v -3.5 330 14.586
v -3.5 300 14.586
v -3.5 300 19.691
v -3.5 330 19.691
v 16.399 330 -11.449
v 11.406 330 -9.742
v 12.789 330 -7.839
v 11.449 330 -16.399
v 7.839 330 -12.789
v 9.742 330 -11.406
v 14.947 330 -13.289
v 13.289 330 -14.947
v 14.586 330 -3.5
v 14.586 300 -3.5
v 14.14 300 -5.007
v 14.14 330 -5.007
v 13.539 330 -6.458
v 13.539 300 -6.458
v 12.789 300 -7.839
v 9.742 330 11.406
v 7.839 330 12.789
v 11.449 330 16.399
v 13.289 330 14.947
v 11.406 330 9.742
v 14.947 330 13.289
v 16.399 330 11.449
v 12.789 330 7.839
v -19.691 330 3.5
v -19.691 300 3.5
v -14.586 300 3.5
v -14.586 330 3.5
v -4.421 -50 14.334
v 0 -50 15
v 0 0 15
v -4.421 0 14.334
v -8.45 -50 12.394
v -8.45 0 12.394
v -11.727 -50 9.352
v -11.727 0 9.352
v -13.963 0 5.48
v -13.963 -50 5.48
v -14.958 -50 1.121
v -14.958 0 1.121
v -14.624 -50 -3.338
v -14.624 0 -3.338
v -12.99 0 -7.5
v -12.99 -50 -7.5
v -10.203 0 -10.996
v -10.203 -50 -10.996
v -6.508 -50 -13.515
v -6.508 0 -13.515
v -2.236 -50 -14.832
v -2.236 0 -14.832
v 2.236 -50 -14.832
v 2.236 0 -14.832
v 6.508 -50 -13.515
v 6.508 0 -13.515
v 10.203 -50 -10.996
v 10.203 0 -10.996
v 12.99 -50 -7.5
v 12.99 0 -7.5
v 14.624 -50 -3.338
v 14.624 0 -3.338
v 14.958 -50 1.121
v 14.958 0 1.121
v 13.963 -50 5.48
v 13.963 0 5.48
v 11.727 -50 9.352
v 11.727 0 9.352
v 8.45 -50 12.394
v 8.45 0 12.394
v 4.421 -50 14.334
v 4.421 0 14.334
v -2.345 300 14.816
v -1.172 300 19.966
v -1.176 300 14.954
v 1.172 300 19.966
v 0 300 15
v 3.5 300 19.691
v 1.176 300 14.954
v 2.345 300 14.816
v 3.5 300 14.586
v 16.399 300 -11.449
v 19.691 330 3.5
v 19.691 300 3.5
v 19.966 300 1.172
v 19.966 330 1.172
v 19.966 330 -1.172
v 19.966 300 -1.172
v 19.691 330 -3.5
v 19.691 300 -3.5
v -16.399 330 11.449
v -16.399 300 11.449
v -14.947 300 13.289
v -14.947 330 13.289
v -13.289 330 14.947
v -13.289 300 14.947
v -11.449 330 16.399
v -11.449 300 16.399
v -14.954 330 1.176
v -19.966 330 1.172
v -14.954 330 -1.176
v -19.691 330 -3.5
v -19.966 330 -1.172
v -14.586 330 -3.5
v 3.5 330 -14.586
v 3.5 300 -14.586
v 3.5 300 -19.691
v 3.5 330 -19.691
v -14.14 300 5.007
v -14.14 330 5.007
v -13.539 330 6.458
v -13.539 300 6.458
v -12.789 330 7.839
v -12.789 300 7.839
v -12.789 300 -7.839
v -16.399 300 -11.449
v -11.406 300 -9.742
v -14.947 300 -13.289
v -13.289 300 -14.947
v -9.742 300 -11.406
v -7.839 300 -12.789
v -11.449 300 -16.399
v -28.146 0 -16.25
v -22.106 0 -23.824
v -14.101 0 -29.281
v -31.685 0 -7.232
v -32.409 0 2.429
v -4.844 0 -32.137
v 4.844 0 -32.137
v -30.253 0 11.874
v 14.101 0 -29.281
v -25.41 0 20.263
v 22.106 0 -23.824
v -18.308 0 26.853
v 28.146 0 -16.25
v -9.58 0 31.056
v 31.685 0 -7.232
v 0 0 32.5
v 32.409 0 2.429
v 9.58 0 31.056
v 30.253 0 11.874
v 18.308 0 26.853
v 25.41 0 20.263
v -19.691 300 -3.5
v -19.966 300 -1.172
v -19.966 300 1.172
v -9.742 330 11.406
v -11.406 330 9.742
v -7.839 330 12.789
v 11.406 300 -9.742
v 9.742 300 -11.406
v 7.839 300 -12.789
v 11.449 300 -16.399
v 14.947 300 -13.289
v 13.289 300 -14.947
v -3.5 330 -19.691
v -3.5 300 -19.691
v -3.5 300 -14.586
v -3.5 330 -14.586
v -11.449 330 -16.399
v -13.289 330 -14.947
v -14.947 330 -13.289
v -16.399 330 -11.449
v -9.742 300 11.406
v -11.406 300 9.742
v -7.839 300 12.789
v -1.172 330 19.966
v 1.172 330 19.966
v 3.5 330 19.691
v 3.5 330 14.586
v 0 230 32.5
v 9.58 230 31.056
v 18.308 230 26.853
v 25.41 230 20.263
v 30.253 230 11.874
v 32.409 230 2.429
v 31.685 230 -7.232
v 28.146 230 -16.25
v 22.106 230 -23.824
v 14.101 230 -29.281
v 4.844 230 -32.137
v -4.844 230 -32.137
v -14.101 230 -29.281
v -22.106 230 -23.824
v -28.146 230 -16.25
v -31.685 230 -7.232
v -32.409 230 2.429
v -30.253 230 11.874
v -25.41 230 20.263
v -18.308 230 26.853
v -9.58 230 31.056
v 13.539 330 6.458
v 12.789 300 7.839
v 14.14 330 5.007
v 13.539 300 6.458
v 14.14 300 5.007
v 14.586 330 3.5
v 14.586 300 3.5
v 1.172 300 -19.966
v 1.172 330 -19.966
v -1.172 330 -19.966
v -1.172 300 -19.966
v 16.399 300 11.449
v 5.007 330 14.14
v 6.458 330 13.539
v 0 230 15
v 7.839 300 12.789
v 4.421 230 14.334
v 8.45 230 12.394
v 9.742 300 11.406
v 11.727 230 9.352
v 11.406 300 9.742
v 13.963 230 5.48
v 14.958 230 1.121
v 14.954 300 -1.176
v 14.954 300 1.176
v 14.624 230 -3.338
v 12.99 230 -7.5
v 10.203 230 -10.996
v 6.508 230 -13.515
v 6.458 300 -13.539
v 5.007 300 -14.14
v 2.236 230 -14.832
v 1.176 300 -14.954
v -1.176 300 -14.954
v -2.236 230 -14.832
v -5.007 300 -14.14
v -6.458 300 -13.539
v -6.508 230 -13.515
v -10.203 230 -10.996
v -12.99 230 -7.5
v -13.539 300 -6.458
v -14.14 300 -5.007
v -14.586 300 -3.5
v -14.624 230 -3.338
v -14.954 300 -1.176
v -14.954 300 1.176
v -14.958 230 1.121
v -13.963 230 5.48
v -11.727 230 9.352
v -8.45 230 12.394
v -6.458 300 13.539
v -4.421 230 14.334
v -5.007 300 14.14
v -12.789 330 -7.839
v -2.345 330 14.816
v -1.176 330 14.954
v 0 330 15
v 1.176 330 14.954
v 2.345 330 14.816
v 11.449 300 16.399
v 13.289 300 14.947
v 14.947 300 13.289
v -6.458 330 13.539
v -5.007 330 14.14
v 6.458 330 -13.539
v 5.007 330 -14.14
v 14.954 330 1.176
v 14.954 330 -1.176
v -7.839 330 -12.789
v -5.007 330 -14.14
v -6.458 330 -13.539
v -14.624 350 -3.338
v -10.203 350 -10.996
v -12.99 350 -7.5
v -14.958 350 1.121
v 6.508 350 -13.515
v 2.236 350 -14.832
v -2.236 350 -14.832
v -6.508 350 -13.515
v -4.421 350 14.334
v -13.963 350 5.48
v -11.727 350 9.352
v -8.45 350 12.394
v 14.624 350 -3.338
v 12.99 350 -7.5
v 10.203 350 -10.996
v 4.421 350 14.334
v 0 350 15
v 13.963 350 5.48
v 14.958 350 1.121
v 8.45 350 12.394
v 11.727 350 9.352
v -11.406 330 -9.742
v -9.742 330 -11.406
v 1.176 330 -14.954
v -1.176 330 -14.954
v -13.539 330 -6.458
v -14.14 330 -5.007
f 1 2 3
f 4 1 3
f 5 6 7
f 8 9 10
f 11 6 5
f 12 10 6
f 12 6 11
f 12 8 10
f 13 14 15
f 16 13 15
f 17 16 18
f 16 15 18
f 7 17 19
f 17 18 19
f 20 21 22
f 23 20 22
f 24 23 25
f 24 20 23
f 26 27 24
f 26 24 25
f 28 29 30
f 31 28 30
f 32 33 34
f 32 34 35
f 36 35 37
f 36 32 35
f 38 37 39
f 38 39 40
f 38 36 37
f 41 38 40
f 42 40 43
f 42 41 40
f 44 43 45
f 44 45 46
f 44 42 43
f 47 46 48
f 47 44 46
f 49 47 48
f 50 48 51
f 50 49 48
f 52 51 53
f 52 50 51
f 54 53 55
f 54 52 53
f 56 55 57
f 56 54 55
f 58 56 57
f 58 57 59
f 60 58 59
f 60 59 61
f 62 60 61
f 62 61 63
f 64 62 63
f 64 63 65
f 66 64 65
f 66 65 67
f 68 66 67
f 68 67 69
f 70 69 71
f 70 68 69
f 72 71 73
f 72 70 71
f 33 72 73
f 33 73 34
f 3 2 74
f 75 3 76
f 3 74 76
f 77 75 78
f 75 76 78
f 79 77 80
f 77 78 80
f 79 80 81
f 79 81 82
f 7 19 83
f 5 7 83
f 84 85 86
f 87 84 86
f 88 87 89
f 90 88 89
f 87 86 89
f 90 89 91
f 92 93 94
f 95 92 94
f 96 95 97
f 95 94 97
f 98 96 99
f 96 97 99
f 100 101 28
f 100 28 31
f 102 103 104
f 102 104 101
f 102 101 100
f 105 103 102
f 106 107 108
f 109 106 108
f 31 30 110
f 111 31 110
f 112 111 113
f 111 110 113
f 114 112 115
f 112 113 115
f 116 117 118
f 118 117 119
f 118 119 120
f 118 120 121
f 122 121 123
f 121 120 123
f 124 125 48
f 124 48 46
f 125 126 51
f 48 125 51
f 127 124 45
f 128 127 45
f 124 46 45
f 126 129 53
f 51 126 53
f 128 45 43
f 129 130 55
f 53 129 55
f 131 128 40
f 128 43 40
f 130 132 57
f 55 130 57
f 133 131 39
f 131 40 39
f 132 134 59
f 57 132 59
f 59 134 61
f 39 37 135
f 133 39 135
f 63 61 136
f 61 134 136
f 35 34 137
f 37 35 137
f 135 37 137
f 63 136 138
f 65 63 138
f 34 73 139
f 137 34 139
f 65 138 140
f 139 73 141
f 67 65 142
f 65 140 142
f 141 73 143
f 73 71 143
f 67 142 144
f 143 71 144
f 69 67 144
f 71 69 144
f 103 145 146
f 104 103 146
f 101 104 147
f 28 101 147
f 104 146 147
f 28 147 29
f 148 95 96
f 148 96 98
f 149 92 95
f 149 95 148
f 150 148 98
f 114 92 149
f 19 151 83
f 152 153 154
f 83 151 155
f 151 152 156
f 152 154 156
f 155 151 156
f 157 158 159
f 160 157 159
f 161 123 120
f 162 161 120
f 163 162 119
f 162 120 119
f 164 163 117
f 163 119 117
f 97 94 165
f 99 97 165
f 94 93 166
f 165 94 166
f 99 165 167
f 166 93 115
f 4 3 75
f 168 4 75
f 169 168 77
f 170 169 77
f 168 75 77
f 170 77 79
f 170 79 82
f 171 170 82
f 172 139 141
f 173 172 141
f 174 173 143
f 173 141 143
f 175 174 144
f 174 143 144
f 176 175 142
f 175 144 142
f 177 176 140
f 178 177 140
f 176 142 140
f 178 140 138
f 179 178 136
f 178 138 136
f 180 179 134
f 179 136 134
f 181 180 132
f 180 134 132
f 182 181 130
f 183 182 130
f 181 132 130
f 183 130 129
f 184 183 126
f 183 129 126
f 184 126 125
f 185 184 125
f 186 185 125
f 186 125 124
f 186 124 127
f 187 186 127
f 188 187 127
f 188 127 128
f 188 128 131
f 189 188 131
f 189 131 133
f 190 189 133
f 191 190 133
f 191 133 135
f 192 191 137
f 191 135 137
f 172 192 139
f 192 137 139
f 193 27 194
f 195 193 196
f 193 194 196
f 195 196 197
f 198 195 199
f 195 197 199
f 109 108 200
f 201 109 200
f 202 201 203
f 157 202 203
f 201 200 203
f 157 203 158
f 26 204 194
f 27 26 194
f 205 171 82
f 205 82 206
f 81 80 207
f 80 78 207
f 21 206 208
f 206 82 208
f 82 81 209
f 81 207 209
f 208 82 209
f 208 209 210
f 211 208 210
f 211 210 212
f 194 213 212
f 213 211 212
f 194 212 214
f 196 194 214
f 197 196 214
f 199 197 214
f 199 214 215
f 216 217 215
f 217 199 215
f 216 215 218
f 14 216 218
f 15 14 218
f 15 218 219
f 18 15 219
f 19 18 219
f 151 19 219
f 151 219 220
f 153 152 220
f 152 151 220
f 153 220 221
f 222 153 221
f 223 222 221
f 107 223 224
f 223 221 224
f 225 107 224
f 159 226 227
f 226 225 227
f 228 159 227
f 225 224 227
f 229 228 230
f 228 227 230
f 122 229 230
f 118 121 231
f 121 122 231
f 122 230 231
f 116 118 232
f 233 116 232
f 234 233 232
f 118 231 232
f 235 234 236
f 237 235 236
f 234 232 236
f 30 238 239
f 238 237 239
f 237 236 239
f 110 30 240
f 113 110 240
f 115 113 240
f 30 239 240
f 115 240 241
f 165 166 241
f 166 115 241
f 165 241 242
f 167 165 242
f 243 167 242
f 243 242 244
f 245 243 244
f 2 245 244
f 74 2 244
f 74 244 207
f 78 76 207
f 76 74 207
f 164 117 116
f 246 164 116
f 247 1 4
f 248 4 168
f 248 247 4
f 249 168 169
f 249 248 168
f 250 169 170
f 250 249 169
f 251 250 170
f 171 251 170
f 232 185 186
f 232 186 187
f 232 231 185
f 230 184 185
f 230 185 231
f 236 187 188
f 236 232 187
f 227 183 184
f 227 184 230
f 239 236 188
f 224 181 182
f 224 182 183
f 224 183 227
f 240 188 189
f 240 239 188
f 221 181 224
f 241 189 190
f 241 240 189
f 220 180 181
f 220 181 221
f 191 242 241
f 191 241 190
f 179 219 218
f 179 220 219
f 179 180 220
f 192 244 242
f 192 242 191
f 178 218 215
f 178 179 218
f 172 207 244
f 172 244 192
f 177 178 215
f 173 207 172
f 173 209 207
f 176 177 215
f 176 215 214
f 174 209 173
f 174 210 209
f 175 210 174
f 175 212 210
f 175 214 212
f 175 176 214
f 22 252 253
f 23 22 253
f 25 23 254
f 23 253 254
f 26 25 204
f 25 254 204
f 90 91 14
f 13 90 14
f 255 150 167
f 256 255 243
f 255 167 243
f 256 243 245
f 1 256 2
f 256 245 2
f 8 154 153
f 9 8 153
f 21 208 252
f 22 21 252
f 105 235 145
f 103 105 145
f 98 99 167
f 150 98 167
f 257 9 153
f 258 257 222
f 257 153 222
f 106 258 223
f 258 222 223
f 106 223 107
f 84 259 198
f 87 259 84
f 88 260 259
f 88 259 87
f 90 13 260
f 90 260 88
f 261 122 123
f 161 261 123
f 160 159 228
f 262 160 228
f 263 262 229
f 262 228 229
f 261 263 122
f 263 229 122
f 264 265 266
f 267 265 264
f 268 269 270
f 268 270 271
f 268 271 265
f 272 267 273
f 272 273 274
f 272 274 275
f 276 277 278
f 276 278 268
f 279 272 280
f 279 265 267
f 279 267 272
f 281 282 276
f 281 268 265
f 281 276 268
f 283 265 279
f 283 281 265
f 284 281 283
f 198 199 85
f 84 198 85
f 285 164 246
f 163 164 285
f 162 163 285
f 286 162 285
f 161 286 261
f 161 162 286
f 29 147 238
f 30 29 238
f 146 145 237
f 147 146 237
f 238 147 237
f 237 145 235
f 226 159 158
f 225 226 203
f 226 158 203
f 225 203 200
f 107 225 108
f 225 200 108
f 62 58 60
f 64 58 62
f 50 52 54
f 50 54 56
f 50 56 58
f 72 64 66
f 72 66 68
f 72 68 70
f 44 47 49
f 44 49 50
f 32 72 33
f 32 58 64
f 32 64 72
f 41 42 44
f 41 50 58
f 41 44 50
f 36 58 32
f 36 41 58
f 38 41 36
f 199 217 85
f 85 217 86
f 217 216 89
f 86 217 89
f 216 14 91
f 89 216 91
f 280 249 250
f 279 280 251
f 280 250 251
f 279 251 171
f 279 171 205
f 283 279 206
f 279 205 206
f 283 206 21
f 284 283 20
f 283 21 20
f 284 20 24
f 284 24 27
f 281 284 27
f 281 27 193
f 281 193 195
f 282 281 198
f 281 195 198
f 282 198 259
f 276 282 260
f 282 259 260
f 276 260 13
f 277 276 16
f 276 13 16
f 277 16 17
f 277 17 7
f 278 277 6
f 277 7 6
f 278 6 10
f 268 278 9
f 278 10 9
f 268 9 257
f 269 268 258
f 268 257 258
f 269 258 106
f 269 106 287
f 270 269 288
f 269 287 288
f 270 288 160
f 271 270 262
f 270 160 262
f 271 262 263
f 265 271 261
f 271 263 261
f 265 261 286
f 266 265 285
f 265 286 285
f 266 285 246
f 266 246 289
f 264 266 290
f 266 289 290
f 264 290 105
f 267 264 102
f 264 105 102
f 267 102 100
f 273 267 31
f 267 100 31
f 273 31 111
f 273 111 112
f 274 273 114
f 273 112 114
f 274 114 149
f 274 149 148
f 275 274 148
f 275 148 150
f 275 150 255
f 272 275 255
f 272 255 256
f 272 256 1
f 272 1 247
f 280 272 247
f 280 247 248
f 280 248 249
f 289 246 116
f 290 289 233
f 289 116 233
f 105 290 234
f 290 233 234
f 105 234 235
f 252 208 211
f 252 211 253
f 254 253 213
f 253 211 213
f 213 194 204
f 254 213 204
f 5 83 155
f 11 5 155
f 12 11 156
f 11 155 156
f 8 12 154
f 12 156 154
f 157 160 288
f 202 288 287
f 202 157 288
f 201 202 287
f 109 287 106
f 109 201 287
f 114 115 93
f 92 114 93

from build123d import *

# Parameters (mm, degrees)
SKETCH1_R           = 32.5
BOSS_EXTRUDE1_DEPTH = 230
SKETCH2_R           = 15
BOSS_EXTRUDE2_DEPTH = 100
BOSS_EXTRUDE3_START = 50
SKETCH3_R           = 15
BOSS_EXTRUDE3_DEPTH = 50
BOSS_EXTRUDE4_START = -30
BOSS_EXTRUDE4_DEPTH = 30
SKETCH5_R           = 15
BOSS_EXTRUDE5_DEPTH = 20


with BuildPart() as part:
    # Sketch1 → Boss-Extrude1 (new body)
    with BuildSketch(Plane(origin=(0, 0, 0), x_dir=(1, 0, 0), z_dir=(0, 1, 0))):
        with Locations(Location((0, 0, 0), (0, 0, 270))):
            Circle(SKETCH1_R)
    extrude(amount=BOSS_EXTRUDE1_DEPTH)

    # Sketch2 → Boss-Extrude2 (add)
    with BuildSketch(Plane(origin=(0, 230, 0), x_dir=(1, 0, 0), z_dir=(0, 1, 0))):
        with Locations(Location((0, 0, 0), (0, 0, 270))):
            Circle(SKETCH2_R)
    extrude(amount=BOSS_EXTRUDE2_DEPTH)

    # Sketch3 → Boss-Extrude3 (add)
    with BuildSketch(Plane.XZ.offset(BOSS_EXTRUDE3_START)):
        with Locations(Location((0, 0, 0), (0, 0, 90))):
            Circle(SKETCH3_R)
    extrude(amount=-BOSS_EXTRUDE3_DEPTH)

    # Sketch4 → Boss-Extrude4 (add)
    with BuildSketch(Plane(origin=(0, 330, 0), x_dir=(1, 0, 0), z_dir=(0, 1, 0)).offset(BOSS_EXTRUDE4_START)):
        with BuildLine():
            Line((-3.5, 19.691368668), (-3.5, 14.585952146))
            ThreePointArc((-3.5, 14.585952146), (-5.740251485, 13.858192988), (-7.838951938, 12.788699407))
            Line((-7.838951938, 12.788699407), (-11.449026581, 16.39877405))
            ThreePointArc((-11.449026581, 16.39877405), (-14.142135624, 14.142135624), (-16.39877405, 11.449026581))
            Line((-16.39877405, 11.449026581), (-12.788699407, 7.838951938))
            ThreePointArc((-12.788699407, 7.838951938), (-13.858192988, 5.740251485), (-14.585952146, 3.5))
            Line((-14.585952146, 3.5), (-19.691368668, 3.5))
            ThreePointArc((-19.691368668, 3.5), (-20, 0), (-19.691368668, -3.5))
            Line((-19.691368668, -3.5), (-14.585952146, -3.5))
            ThreePointArc((-14.585952146, -3.5), (-13.858192988, -5.740251485), (-12.788699407, -7.838951938))
            Line((-12.788699407, -7.838951938), (-16.39877405, -11.449026581))
            ThreePointArc((-16.39877405, -11.449026581), (-14.142135624, -14.142135624), (-11.449026581, -16.39877405))
            Line((-11.449026581, -16.39877405), (-7.838951938, -12.788699407))
            ThreePointArc((-7.838951938, -12.788699407), (-5.740251485, -13.858192988), (-3.5, -14.585952146))
            Line((-3.5, -14.585952146), (-3.5, -19.691368668))
            ThreePointArc((-3.5, -19.691368668), (0, -20), (3.5, -19.691368668))
            Line((3.5, -19.691368668), (3.5, -14.585952146))
            ThreePointArc((3.5, -14.585952146), (5.740251485, -13.858192988), (7.838951938, -12.788699407))
            Line((7.838951938, -12.788699407), (11.449026581, -16.39877405))
            ThreePointArc((11.449026581, -16.39877405), (14.142135624, -14.142135624), (16.39877405, -11.449026581))
            Line((16.39877405, -11.449026581), (12.788699407, -7.838951938))
            ThreePointArc((12.788699407, -7.838951938), (13.858192988, -5.740251485), (14.585952146, -3.5))
            Line((14.585952146, -3.5), (19.691368668, -3.5))
            ThreePointArc((19.691368668, -3.5), (20, 0), (19.691368668, 3.5))
            Line((19.691368668, 3.5), (14.585952146, 3.5))
            ThreePointArc((14.585952146, 3.5), (13.858192988, 5.740251485), (12.788699407, 7.838951938))
            Line((12.788699407, 7.838951938), (16.39877405, 11.449026581))
            ThreePointArc((16.39877405, 11.449026581), (14.142135624, 14.142135624), (11.449026581, 16.39877405))
            Line((11.449026581, 16.39877405), (7.838951938, 12.788699407))
            ThreePointArc((7.838951938, 12.788699407), (5.740251485, 13.858192988), (3.5, 14.585952146))
            Line((3.5, 14.585952146), (3.5, 19.691368668))
            ThreePointArc((3.5, 19.691368668), (0, 20), (-3.5, 19.691368668))
        make_face()
    extrude(amount=BOSS_EXTRUDE4_DEPTH)

    # Sketch5 → Boss-Extrude5 (add)
    with BuildSketch(Plane(origin=(0, 330, 0), x_dir=(1, 0, 0), z_dir=(0, 1, 0))):
        with Locations(Location((0, 0, 0), (0, 0, 270))):
            Circle(SKETCH5_R)
    extrude(amount=BOSS_EXTRUDE5_DEPTH)


solid = part.part
